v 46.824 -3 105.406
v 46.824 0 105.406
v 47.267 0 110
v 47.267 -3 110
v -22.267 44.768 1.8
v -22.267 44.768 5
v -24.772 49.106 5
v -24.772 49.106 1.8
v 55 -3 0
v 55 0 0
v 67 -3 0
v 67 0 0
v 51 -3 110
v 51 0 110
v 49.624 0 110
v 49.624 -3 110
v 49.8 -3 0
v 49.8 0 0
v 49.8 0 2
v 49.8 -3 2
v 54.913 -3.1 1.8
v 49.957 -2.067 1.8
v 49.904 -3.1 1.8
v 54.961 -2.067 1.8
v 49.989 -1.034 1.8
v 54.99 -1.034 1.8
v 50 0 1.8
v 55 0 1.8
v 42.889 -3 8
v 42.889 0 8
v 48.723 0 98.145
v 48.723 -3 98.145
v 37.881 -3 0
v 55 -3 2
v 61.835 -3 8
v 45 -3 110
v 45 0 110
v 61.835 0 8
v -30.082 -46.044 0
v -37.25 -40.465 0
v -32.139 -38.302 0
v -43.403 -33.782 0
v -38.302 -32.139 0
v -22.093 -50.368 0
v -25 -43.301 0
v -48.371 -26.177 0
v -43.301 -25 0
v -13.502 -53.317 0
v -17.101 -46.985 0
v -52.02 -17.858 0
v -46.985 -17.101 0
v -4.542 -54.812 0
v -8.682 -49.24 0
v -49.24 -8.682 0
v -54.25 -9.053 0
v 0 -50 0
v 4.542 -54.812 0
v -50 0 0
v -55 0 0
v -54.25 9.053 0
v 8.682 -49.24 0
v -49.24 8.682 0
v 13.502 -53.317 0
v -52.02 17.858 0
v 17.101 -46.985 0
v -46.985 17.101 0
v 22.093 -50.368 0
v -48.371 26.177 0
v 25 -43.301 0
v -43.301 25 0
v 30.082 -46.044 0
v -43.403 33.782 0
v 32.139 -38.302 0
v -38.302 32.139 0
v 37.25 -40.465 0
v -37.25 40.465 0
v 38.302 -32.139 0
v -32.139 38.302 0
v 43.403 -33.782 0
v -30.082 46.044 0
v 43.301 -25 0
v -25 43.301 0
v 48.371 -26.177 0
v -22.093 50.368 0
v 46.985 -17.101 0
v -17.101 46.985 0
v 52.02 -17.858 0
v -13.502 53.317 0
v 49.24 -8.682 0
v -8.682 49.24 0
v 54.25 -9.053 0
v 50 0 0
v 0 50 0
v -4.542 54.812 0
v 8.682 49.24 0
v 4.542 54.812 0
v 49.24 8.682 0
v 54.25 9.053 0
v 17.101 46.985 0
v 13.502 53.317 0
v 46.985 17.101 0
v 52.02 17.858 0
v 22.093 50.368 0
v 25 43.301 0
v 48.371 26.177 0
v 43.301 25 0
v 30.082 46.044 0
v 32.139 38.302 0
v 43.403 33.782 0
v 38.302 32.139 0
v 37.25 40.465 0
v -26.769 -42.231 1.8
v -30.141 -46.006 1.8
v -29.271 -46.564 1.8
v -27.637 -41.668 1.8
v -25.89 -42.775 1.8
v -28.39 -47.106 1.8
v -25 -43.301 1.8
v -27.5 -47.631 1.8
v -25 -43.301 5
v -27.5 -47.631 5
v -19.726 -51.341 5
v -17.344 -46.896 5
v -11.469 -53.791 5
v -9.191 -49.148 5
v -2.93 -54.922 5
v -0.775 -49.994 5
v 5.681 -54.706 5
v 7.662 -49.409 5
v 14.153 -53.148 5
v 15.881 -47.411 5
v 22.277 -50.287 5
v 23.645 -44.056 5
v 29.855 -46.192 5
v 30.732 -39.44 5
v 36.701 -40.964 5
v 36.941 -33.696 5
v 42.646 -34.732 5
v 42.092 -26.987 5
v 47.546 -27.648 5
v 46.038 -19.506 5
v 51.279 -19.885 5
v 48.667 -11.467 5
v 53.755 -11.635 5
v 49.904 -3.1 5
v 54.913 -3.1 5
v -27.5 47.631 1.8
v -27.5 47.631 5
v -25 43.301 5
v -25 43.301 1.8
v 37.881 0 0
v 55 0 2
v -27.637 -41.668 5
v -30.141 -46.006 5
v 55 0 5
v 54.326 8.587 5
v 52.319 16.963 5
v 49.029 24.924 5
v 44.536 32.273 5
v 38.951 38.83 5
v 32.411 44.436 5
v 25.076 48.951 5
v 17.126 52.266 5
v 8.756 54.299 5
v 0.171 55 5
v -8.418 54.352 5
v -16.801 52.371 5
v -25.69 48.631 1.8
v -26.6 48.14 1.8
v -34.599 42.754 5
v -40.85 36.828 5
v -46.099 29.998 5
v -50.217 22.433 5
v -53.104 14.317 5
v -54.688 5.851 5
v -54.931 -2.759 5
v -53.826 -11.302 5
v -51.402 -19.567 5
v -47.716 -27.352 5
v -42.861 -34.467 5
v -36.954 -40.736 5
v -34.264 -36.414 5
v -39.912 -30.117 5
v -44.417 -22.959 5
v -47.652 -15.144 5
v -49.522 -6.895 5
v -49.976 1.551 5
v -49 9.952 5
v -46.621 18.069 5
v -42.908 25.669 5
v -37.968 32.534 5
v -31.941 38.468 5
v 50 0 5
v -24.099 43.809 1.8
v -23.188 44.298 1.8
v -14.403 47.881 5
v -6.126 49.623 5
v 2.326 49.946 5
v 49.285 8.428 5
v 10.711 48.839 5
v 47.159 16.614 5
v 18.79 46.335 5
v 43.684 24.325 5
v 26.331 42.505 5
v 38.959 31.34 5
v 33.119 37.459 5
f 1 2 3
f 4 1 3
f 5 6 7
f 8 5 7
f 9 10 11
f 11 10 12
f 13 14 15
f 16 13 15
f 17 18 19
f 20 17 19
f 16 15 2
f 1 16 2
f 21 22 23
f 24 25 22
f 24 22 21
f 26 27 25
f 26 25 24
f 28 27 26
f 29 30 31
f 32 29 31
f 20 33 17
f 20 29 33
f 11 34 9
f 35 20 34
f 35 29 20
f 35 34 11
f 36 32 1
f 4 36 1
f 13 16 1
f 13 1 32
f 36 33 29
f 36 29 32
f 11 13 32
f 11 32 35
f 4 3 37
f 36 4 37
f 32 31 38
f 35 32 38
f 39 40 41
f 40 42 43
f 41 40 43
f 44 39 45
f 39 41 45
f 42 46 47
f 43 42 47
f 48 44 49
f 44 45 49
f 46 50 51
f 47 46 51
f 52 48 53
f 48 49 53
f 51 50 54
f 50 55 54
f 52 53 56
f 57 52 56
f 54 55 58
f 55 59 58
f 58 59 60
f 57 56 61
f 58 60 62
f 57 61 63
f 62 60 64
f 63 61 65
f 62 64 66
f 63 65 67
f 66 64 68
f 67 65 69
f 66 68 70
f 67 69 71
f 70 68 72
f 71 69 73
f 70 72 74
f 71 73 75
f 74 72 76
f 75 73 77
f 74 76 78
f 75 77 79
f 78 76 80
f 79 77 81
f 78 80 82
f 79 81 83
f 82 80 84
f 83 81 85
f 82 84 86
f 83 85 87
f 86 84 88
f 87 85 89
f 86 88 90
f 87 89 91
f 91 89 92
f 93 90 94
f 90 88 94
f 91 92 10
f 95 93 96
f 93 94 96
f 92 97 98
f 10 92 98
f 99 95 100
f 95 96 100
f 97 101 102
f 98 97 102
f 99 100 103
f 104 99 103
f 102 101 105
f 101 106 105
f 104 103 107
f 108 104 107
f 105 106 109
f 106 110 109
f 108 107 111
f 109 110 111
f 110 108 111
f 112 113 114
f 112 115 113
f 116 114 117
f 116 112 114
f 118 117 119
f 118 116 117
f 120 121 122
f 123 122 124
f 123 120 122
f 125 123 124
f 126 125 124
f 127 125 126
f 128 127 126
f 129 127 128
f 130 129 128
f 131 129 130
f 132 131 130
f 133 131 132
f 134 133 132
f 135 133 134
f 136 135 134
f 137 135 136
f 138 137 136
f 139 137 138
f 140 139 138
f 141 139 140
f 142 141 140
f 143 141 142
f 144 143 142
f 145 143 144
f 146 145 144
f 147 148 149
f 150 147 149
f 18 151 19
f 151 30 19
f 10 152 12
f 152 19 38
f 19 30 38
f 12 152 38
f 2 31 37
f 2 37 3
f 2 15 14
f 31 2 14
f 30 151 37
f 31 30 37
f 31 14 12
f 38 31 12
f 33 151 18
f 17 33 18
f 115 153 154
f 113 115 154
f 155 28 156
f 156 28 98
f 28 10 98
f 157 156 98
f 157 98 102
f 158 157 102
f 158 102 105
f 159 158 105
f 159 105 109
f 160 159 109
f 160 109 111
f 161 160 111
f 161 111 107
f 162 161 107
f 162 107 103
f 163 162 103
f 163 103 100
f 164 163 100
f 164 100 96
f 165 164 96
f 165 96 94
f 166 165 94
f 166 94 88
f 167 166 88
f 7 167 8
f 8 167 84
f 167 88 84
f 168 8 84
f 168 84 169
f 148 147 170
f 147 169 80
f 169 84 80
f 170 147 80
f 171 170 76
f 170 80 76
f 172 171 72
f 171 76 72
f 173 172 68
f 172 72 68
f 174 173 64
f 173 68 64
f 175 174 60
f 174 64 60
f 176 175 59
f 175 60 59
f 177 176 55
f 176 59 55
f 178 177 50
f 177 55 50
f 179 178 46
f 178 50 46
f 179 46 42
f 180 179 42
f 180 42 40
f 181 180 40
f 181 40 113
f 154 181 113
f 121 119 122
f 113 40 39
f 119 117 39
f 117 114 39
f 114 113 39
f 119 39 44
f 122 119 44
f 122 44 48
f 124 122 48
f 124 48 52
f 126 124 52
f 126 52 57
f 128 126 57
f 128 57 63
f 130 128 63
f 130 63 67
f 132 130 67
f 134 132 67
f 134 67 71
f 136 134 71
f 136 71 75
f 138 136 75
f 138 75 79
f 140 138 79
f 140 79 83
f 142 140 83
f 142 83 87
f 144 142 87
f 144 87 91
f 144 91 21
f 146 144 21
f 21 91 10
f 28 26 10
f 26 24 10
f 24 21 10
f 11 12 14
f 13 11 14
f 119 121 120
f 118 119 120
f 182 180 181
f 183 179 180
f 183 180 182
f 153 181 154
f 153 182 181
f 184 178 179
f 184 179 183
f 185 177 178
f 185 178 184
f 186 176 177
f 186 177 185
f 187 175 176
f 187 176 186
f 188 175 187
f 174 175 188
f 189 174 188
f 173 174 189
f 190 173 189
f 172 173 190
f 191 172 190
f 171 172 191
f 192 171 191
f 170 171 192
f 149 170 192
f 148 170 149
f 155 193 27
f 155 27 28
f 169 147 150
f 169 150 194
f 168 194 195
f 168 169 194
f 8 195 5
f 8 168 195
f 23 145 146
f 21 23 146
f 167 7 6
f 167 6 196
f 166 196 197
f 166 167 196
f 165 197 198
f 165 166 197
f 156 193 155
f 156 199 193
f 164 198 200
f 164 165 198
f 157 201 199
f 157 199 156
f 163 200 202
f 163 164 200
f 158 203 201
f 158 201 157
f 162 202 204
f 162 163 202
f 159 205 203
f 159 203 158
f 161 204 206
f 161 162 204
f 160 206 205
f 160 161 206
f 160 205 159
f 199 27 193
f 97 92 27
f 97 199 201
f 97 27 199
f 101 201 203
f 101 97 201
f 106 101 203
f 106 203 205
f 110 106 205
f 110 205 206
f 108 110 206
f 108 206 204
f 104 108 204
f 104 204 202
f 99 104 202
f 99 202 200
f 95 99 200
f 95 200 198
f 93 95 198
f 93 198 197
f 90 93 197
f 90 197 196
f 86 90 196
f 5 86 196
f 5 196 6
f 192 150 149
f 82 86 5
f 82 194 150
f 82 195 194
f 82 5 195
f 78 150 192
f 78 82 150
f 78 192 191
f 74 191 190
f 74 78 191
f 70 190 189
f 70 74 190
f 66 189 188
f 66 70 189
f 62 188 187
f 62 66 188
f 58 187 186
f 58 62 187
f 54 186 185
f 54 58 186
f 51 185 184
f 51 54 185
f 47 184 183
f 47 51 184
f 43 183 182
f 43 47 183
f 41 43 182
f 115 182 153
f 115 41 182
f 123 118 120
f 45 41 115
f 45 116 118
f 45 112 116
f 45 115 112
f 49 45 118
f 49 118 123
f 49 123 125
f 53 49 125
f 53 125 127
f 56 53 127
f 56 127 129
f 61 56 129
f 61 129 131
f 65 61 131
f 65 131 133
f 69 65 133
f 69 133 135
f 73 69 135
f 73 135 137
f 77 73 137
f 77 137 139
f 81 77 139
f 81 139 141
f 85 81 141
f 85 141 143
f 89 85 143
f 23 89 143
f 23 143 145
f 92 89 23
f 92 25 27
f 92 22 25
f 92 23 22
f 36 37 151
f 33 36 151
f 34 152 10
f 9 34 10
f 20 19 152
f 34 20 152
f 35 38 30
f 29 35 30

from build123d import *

# Parameters (mm, degrees)
F5_DEPTH = 3
F6_R     = 55
F6_R_2   = 50
F7_DEPTH = 5
F8_W     = 6.9784420547
F8_H     = 3.1
F9_DEPTH = 3.2


with BuildPart() as f5:
    # F4 (on Front) → F5 (new body)
    with BuildSketch(Plane.XZ):
        Polygon((47.2665503621, 110), (45, 110), (37.8812104464, 0), (49.8, 0), (49.8, 2), (55, 2), (55, 0), (67, 0), (51, 110), (49.6243909001, 110), (46.8244552612, 105.406075716), align=None)
        Polygon((61.8351592405, 8), (42.8892941961, 8), (48.7231474716, 98.1450809113), align=None, mode=Mode.SUBTRACT)
    extrude(amount=F5_DEPTH)


with BuildPart() as f7:
    # F6 (on Top) → F7 (new body)
    with BuildSketch(Plane.XY):
        Circle(F6_R)
        Circle(F6_R_2, mode=Mode.SUBTRACT)
    extrude(amount=F7_DEPTH)

    # F8 (on face) → F9 (cut)
    with BuildSketch(Plane.XY.offset(5)):
        with Locations((52.5480711023, -1.55)):
            Rectangle(F8_W, F8_H)
        Polygon((-28.0186460648, 48.5297185436), (-24.5294250375, 42.4862104453), (-21.8447462857, 44.0362104453), (-25.3339673131, 50.0797185436), align=None)
        Polygon((-28.0186460648, -48.5297185436), (-24.5294250375, -42.4862104453), (-27.2141037892, -40.9362104453), (-30.7033248166, -46.9797185436), align=None)
    extrude(amount=-F9_DEPTH, mode=Mode.SUBTRACT)


solid = Compound([f5.part, f7.part])
